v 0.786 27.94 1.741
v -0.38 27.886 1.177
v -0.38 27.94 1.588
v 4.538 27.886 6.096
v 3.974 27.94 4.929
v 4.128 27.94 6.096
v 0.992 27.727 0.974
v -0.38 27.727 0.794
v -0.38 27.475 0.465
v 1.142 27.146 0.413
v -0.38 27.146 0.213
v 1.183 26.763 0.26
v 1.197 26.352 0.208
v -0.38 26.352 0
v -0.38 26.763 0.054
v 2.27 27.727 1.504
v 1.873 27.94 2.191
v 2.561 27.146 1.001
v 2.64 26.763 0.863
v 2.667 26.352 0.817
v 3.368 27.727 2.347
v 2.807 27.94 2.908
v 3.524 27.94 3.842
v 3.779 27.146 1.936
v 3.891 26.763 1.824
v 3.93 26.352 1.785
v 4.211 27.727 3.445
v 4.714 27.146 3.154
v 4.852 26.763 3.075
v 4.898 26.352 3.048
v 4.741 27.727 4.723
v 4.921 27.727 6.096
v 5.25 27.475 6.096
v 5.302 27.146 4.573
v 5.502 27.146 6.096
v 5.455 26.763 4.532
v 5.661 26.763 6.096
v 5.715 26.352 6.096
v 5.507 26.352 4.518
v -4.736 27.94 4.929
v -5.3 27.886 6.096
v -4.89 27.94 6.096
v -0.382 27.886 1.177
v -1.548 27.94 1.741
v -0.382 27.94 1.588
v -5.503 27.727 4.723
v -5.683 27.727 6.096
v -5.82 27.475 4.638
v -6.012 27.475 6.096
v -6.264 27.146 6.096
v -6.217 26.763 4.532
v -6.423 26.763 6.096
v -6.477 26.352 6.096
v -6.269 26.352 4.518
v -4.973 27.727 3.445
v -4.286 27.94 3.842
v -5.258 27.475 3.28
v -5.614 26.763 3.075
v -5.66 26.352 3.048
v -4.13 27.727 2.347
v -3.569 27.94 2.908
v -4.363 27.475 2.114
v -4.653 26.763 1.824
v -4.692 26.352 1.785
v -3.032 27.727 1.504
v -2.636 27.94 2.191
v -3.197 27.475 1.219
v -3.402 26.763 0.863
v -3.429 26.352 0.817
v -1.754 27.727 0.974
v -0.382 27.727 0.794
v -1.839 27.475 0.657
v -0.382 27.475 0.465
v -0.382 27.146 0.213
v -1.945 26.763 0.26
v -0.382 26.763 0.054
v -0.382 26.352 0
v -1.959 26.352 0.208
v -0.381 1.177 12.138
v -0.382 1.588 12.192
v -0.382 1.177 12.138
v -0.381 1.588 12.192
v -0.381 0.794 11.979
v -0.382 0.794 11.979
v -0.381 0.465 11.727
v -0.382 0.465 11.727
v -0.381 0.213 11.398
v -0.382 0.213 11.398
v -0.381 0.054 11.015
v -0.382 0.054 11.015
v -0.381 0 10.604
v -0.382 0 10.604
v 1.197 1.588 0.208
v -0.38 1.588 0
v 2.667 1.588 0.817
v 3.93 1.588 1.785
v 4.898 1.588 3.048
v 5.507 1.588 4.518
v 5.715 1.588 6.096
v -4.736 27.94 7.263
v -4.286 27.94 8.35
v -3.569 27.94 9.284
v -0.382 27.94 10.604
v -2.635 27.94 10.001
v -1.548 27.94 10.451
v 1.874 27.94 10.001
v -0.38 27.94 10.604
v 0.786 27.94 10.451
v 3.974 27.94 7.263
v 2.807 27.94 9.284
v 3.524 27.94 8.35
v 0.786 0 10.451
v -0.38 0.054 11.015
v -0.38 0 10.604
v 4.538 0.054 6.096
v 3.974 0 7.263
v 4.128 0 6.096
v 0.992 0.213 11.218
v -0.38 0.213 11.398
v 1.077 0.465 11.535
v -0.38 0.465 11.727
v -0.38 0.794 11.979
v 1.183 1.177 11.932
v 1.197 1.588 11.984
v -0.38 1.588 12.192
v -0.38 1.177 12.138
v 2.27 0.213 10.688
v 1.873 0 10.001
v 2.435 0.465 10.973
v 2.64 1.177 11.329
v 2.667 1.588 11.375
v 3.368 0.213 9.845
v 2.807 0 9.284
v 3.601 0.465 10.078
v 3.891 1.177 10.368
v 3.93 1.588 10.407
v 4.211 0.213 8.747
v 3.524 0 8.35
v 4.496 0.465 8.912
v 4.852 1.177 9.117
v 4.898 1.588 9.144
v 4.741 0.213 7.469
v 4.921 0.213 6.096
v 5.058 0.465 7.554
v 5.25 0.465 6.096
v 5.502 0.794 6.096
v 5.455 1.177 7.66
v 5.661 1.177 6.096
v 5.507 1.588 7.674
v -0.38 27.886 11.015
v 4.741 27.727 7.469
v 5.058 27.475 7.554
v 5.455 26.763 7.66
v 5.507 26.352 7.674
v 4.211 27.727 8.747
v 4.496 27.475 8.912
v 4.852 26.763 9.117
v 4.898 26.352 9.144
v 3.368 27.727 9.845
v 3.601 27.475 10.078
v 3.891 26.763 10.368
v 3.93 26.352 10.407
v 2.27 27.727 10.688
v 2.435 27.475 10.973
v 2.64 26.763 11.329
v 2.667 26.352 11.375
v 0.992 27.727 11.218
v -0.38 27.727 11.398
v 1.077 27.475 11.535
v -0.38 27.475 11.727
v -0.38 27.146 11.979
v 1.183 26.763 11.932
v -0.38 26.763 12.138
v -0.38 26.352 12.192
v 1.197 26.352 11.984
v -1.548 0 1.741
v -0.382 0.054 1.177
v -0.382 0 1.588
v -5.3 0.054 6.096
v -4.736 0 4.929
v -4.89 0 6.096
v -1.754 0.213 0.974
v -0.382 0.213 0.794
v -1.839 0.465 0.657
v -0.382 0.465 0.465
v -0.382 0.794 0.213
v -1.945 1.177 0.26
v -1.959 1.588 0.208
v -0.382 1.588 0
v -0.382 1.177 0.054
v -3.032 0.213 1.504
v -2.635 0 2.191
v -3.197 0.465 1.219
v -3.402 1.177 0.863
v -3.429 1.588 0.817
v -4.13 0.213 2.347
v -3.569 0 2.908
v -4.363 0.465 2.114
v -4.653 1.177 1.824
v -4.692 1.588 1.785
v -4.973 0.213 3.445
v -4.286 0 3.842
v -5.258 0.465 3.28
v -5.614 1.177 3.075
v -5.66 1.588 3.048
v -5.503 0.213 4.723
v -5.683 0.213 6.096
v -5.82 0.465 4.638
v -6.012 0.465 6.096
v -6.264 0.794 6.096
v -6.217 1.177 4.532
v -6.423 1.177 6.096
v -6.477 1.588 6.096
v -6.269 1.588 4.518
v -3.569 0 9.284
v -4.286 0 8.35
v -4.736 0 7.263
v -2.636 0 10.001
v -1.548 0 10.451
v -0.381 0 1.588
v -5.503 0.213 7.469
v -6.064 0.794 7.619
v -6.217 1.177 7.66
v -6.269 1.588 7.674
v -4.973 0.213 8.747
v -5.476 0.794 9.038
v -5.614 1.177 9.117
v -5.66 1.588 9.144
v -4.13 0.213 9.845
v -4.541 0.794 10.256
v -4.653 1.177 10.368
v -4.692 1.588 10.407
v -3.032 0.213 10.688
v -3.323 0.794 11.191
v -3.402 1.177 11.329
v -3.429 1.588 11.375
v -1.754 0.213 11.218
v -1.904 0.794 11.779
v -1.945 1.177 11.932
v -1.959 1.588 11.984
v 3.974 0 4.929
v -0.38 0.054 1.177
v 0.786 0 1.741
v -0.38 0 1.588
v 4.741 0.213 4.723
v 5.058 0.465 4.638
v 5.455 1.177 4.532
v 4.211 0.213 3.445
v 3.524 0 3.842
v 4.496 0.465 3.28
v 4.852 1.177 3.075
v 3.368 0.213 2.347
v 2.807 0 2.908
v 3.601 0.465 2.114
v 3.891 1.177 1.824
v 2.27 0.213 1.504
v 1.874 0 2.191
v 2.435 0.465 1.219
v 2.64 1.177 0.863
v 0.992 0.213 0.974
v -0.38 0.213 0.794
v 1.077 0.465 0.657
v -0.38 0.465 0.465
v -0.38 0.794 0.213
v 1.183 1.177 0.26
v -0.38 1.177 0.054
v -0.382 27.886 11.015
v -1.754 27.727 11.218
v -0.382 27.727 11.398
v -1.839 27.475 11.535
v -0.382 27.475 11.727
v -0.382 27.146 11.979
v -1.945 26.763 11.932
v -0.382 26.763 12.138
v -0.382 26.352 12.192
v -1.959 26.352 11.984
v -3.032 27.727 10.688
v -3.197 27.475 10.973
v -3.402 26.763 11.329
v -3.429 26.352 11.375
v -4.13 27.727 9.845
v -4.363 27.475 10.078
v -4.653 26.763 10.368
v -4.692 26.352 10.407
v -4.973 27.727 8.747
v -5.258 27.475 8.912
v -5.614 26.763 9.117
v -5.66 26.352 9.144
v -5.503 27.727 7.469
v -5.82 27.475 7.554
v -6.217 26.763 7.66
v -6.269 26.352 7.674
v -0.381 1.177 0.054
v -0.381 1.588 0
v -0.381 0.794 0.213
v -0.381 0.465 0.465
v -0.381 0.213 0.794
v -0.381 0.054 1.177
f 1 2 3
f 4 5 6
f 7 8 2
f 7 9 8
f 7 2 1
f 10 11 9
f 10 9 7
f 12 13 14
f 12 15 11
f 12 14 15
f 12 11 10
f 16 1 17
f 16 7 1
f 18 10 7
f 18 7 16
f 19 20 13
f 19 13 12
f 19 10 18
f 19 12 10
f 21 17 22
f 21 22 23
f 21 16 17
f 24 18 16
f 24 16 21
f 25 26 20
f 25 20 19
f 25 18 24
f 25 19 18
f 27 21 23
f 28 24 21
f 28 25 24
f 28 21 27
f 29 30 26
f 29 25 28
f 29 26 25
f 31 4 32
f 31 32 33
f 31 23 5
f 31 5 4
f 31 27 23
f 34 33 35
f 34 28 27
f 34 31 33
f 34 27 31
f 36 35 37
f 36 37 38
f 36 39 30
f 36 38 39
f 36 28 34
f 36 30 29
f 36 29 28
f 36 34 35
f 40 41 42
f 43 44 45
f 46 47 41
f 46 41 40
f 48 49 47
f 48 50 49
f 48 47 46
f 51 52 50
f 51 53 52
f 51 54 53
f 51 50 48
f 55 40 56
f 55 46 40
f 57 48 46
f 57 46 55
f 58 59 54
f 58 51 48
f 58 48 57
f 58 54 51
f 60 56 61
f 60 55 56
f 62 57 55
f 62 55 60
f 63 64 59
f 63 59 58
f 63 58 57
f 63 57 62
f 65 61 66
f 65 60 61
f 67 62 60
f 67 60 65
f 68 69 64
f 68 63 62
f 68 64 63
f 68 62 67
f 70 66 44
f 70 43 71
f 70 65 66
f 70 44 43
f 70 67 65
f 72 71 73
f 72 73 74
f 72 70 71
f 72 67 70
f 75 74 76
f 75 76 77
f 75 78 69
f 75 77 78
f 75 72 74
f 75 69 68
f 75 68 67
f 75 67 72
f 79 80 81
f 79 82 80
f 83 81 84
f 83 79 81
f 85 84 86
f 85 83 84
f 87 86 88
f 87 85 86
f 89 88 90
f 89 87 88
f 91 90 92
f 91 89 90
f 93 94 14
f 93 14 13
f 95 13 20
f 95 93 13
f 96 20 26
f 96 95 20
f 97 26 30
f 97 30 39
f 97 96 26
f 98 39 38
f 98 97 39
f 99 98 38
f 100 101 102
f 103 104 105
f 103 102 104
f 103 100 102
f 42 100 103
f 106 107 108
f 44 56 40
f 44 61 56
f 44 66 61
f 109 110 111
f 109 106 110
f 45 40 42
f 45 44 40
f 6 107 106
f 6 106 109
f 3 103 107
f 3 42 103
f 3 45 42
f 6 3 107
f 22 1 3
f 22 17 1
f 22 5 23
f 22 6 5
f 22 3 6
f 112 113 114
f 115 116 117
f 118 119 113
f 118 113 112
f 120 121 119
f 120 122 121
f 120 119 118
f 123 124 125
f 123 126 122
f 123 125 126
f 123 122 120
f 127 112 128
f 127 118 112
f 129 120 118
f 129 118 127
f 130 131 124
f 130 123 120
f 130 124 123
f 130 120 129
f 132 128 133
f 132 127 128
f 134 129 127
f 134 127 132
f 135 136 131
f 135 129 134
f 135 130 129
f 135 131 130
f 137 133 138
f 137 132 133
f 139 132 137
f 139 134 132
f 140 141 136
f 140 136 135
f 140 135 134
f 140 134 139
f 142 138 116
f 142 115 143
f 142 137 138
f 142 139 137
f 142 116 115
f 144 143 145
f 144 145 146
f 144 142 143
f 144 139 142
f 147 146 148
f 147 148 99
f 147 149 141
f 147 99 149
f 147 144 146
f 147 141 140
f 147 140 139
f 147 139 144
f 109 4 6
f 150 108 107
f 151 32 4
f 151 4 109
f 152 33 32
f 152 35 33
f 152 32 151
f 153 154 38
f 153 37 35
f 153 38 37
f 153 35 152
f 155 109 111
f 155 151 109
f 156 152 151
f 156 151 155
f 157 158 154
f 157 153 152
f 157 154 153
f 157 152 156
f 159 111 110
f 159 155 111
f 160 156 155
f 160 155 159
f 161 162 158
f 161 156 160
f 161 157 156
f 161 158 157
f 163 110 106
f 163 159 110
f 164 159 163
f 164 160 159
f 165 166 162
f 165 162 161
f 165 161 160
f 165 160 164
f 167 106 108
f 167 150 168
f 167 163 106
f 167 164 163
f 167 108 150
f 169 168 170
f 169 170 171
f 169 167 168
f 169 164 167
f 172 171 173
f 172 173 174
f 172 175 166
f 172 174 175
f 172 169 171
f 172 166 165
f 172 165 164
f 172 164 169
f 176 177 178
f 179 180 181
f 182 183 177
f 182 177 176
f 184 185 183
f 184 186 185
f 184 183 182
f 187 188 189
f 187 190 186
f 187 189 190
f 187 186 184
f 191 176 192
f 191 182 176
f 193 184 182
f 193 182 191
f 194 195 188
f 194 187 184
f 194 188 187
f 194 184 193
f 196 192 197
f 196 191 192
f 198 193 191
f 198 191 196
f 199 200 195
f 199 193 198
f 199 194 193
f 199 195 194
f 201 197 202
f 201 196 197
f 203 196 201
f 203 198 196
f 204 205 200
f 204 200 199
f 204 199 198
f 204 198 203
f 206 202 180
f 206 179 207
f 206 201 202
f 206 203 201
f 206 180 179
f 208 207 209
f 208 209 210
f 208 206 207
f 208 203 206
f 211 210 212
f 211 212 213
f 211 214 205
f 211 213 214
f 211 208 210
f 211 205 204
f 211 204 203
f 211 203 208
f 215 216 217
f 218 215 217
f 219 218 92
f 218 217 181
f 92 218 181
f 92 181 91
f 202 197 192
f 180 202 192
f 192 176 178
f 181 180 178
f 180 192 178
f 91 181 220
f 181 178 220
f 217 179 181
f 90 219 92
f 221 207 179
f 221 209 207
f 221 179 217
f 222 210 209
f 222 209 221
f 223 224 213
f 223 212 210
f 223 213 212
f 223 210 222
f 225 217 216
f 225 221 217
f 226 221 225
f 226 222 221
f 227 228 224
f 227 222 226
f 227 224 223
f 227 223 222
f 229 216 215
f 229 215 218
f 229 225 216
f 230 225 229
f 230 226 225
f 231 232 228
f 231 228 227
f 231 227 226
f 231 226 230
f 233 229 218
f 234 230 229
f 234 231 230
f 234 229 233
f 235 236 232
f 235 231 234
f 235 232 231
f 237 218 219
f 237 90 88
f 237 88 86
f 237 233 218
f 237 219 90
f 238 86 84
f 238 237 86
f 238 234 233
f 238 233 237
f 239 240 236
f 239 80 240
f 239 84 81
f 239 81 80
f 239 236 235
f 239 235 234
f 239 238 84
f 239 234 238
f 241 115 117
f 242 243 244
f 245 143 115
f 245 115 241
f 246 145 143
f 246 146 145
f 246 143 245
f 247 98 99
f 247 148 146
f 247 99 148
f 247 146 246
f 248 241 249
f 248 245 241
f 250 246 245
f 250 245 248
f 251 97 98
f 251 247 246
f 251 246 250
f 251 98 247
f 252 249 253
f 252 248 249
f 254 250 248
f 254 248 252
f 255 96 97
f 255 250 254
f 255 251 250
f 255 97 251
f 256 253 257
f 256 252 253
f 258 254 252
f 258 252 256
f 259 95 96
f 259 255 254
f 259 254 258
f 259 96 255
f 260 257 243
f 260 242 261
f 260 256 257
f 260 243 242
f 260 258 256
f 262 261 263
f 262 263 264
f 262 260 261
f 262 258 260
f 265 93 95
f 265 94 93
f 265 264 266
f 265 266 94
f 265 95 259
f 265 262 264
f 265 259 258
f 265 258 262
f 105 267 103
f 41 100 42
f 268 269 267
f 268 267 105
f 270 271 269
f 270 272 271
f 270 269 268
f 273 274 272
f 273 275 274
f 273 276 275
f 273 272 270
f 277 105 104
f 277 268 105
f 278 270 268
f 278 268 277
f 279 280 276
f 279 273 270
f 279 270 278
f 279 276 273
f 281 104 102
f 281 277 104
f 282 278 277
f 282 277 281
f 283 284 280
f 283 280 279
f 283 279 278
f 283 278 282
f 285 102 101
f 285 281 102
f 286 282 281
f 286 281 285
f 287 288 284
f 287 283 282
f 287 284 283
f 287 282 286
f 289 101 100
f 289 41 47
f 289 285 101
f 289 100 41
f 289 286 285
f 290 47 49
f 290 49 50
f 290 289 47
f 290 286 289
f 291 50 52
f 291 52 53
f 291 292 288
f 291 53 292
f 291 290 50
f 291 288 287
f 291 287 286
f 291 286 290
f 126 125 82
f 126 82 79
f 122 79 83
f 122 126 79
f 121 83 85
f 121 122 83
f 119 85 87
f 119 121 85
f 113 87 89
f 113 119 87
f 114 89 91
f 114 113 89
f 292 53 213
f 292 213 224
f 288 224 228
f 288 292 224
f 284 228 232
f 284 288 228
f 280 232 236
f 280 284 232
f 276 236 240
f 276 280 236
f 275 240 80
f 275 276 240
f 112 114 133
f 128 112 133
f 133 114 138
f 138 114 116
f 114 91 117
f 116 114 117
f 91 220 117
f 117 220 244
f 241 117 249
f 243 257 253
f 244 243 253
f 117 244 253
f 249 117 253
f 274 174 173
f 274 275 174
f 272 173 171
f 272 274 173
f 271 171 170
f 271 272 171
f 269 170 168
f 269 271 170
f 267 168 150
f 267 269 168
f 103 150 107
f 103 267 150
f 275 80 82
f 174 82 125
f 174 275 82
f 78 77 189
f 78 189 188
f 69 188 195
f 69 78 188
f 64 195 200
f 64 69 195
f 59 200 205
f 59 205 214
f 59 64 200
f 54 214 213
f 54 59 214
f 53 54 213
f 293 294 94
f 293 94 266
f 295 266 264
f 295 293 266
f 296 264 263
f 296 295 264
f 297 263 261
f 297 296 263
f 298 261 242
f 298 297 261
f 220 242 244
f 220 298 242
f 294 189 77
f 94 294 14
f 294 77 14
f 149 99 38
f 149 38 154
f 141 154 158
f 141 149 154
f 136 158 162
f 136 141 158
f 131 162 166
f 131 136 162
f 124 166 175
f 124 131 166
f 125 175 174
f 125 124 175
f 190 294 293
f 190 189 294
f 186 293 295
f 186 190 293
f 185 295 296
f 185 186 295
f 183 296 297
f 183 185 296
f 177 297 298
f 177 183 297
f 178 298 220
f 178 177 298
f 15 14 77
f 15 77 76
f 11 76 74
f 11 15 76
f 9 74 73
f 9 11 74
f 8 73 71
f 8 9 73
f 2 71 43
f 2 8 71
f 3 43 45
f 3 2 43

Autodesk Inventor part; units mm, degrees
ref_plane "YZ Plane" through (0, 0, 0) normal (1, 0, 0) x (0, 1, 0)
ref_plane "XZ Plane" through (0, 0, 0) normal (0, 1, 0) x (-1, 0, 0)
ref_plane "XY Plane" through (0, 0, 0) normal (0, 0, 1) x (1, 0, 0)
sketch "Sketch1" plane through (0, 0, 0) normal (0, 0, 1) x (1, 0, 0)
  line L0 (-0.381, -9.136) -> (-0.381, 8.4693)
  line L1 (-6.477, 0) -> (5.715, 0)
  line L2 (-6.477, 0) -> (-6.477, 27.94)
  line L3 (-6.477, 27.94) -> (5.715, 27.94)
  line L4 (5.715, 27.94) -> (5.715, 0)
  point P0 (0, 0)
  dimension "dw" = 12.192
  dimension "d1" = 6.096
  dimension "d2" = 27.94
extrude "Extrusion1" add sketch "Sketch1" along normal blind 12.192
fillet "Fillet1" radius 6.096 4 edges at (5.715, 13.97, 12.192) (5.715, 13.97, 0) (-6.477, 13.97, 0) (-6.477, 13.97, 12.192)
fillet "Fillet2" radius 1.5875 3 edges at (5.715, 27.94, 6.096) (3.9297, 27.94, 10.4067) (-0.381, 27.94, 12.192)
fillet "Fillet3" radius 1.5875 3 edges at (-0.381, 0, 12.192) (3.9297, 0, 10.4067) (5.715, 0, 6.096)
equation "\"d1\" = 0.5 * dw"
equation "\"d3\" = dw"
equation "\"d5\" = 0.5 * dw"
properties part number "dowel"
